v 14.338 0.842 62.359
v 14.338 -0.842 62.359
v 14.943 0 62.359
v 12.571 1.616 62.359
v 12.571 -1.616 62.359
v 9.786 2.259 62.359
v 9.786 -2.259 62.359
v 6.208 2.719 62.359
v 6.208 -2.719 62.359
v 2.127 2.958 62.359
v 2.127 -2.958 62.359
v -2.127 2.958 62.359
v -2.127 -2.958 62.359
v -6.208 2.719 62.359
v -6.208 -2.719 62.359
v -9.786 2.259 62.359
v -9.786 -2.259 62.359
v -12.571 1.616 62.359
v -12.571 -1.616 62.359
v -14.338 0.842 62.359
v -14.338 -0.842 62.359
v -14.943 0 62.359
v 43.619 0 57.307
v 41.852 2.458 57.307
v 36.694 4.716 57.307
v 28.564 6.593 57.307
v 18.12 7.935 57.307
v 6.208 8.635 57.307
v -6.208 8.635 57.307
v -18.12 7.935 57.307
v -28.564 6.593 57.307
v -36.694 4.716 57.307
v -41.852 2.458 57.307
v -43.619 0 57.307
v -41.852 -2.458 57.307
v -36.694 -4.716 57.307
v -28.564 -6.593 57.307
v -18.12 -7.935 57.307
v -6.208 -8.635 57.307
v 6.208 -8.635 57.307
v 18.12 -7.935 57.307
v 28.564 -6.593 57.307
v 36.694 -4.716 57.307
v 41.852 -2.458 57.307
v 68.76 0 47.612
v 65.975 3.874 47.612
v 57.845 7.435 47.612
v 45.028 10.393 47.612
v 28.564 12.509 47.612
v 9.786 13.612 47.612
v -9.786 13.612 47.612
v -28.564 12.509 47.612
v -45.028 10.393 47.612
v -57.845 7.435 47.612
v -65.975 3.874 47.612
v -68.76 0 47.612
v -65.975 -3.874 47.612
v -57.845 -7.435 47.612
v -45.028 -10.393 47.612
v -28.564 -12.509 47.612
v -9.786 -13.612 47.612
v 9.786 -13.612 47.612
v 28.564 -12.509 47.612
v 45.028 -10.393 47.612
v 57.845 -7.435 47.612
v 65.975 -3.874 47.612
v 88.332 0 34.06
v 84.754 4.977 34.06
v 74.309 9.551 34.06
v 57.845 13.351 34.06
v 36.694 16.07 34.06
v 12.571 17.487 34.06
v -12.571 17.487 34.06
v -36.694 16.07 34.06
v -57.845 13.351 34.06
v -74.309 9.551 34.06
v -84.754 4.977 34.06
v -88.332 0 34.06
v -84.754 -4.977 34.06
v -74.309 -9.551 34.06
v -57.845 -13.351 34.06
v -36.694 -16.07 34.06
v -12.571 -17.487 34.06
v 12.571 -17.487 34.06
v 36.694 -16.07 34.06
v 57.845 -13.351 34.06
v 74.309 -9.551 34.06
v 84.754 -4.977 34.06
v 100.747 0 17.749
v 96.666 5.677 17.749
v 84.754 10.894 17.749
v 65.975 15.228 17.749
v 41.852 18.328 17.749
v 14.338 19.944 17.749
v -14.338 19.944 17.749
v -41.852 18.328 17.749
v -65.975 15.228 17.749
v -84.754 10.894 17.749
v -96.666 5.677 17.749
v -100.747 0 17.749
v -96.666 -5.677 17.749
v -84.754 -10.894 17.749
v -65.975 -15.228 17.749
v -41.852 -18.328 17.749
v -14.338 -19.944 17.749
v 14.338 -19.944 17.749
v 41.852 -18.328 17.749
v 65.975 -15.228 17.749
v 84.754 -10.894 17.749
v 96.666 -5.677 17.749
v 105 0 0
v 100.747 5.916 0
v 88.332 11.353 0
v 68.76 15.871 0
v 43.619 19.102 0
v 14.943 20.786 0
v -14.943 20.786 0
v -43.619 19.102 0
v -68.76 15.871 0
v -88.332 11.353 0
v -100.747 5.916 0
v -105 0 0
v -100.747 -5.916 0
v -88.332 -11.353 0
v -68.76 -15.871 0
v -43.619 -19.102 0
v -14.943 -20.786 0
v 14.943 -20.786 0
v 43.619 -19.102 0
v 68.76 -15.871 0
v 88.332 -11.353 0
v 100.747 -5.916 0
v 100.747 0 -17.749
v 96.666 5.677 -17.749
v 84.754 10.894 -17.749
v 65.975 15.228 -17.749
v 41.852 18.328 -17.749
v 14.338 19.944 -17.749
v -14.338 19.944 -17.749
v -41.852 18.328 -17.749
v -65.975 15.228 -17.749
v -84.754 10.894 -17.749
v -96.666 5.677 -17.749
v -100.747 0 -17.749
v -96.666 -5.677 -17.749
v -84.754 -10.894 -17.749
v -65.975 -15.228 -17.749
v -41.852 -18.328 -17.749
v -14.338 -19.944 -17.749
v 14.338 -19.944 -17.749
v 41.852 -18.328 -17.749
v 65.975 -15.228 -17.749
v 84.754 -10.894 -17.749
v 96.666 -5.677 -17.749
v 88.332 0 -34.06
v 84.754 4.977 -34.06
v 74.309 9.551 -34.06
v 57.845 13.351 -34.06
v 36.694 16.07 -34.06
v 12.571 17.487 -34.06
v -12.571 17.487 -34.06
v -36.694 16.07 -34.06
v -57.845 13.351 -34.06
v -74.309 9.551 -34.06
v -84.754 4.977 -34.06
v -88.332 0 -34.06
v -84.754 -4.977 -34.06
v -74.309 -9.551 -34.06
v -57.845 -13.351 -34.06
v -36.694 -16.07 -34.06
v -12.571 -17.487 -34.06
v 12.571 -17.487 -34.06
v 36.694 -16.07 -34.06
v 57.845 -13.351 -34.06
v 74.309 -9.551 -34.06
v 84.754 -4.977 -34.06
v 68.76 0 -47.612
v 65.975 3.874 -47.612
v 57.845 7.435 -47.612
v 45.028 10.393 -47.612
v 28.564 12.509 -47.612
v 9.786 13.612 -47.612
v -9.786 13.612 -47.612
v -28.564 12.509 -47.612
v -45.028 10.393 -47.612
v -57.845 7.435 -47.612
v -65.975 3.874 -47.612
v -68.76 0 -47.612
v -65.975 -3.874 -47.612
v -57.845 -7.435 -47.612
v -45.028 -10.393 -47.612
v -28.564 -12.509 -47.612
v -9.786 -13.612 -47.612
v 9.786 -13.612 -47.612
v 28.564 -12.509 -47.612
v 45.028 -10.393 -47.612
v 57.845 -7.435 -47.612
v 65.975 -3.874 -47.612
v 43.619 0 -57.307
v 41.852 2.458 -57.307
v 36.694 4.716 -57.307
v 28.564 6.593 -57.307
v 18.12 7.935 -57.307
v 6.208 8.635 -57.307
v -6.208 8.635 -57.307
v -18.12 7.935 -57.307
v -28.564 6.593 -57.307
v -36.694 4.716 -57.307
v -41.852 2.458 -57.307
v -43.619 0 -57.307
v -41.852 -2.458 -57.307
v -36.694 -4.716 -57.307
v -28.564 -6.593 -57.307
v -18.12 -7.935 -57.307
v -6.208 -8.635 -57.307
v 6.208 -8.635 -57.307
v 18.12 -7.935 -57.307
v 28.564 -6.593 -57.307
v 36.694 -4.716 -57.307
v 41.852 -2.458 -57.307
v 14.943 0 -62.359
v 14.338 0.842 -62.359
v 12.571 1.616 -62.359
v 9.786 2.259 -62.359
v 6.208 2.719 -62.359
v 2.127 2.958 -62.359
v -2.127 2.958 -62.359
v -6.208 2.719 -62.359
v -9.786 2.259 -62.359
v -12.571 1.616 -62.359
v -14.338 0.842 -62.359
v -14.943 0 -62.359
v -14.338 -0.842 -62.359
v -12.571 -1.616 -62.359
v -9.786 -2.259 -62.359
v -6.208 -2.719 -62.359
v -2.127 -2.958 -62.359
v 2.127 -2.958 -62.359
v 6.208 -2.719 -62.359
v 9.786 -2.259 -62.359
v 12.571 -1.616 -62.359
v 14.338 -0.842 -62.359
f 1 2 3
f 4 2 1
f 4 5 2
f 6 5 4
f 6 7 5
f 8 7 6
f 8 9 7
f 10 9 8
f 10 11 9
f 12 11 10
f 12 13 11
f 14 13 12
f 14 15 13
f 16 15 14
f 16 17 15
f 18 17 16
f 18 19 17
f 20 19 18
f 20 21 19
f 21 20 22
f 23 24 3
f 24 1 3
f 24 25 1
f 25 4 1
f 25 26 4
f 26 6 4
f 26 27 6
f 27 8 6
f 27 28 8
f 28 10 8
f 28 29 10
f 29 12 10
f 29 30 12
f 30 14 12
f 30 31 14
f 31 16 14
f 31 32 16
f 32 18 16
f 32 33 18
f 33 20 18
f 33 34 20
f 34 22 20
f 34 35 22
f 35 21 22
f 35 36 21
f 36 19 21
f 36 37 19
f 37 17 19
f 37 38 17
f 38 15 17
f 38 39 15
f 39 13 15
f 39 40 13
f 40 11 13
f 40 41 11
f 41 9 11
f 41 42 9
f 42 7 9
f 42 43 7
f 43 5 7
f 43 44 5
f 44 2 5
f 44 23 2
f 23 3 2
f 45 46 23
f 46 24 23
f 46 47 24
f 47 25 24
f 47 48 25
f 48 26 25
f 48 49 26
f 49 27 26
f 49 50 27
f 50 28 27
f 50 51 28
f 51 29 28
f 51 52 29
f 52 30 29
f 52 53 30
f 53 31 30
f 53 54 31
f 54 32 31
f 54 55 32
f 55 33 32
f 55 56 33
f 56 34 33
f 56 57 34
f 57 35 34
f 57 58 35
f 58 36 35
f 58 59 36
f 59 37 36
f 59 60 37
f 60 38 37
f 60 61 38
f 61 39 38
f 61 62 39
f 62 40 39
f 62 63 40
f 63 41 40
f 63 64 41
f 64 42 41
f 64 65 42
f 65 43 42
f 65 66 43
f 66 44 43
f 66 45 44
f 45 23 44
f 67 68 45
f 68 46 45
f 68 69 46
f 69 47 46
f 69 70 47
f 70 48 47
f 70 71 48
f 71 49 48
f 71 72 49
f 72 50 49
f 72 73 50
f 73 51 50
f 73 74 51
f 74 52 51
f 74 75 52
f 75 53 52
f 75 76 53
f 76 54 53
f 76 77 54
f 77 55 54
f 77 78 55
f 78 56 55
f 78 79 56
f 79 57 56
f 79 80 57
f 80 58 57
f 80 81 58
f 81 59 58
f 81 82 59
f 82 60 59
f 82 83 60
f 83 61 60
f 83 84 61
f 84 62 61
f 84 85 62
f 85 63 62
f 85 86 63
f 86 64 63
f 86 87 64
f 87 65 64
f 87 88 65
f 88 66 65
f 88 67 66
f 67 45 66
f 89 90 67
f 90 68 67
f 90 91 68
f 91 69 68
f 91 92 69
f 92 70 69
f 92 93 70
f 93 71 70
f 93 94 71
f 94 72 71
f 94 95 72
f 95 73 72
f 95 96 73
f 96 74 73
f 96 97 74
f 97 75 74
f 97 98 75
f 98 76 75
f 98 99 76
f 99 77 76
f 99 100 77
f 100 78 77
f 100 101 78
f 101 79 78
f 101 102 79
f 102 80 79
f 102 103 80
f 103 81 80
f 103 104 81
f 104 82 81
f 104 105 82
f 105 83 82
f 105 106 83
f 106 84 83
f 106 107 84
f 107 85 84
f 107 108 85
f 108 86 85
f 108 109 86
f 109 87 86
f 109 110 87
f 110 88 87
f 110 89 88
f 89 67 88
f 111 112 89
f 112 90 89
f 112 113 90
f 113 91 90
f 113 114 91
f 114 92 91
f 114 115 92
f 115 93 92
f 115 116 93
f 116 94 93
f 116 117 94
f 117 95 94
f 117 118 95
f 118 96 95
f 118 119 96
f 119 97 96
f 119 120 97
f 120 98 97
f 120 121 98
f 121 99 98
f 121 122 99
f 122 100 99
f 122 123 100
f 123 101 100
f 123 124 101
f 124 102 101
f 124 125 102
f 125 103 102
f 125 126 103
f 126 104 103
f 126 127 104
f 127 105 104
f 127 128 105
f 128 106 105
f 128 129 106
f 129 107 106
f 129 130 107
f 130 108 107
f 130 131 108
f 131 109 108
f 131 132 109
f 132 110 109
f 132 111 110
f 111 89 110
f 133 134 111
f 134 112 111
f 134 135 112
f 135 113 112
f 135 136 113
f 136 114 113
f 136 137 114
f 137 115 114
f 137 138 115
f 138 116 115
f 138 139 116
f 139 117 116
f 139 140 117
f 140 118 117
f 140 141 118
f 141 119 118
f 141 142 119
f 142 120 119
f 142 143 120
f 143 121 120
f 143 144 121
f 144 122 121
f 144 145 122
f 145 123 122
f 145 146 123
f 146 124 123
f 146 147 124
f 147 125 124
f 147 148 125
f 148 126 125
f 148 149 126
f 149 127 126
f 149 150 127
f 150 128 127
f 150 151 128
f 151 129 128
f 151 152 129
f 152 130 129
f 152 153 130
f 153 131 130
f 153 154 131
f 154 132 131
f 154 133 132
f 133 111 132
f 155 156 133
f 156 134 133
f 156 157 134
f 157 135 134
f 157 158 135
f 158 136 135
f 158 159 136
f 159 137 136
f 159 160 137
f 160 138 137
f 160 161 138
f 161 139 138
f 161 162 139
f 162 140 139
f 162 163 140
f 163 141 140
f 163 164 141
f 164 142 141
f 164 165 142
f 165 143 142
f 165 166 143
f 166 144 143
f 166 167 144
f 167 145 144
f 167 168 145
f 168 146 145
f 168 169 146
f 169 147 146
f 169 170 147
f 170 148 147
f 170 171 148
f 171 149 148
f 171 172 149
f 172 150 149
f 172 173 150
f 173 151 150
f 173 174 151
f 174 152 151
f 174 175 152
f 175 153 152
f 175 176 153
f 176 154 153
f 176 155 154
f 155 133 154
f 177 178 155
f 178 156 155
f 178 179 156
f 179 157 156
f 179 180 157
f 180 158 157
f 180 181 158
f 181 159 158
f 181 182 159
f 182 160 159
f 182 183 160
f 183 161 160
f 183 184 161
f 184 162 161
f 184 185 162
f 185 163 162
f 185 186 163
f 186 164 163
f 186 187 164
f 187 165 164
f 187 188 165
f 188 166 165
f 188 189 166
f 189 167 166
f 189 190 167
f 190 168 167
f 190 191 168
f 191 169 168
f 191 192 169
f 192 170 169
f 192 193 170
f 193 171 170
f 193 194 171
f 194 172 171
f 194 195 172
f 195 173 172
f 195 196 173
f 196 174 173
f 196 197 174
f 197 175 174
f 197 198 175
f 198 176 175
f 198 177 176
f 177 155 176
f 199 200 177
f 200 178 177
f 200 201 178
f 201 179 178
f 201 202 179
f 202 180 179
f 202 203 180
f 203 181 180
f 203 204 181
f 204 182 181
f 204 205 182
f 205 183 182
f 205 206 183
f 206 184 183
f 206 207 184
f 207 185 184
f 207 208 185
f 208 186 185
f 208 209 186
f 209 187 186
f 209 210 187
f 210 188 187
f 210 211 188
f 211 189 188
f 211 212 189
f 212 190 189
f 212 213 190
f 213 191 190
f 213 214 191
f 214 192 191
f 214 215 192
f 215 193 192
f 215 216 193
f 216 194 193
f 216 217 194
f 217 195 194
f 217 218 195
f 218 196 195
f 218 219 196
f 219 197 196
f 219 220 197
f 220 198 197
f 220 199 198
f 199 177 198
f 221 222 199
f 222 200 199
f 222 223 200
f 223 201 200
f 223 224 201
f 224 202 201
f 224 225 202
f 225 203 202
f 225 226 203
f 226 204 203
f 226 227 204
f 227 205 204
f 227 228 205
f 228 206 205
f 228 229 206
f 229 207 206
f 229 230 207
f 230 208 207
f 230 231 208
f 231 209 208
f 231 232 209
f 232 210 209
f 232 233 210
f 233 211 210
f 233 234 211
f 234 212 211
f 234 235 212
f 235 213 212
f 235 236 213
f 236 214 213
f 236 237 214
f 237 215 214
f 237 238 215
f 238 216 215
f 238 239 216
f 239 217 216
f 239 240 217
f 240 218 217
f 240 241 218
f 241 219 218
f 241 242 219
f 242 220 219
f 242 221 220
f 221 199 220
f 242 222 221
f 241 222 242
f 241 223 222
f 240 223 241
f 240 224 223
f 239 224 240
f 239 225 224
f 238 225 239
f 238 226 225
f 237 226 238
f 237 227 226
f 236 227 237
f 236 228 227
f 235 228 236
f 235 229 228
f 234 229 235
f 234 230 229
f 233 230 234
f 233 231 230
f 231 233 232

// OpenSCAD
// Generated by SolidPython 1.0.1 on 2020-07-29 00:46:51


scale(v = [15, 3, 9]) {
	sphere(r = 7);
}
/***********************************************
*********      SolidPython code:      **********
************************************************
 
# import packages: SolidPython
from solid import *
from solid.utils import *
from itertools import chain, combinations, permutations


class Resize:

    def __init__(self, scad_file):
        self.scad_file = scad_file
        #self.scad_file = import_scad(scad_file)
        # cone/cylinder param:
        self.r1 = 0
        self.r2 = 0
        self.h = 0
        # rectangular prism param:
        self.w = 0
        self.l = 0
        # ellipse param:
        self.r = 0

    # import OpenScad code (file name corresponds to shape)


    # classify shape + parameters
    def assign(self, param1, param2, param3):
        if self.scad_file == 'cone.scad':
            self.r1 = param1
            self.r2 = param2
            self.h = param3
        elif self.scad_file == 'cylinder.scad':
            self.r1 = param1
            self.r2 = param2
            self.h = param3
        elif self.scad_file == 'rectangularPrism.scad':
            self.h = param1
            self.l = param2
            self.w = param3
        else:
            self.r = param1
            self.h = param2

    # resize parameters
    def iterate(self):
        x = range(3, 20, 2)
        i = 1
        if self.scad_file == 'cone.scad':
            tempList = list(permutations(x, 2))
            for temp in tempList:
                param1 = temp[0]
                param2 = temp[1]
                filepath = 'produced_scad_files/' + 'cone' + str(param1) + '_' + str(param2) + '_' + '.scad'
                scad_render_to_file(cylinder(h=param1, r1=param2, r2=0), filepath)

        elif self.scad_file == 'cylinder.scad':
            tempList = list(permutations(x, 3))
            for temp in tempList:
                param1 = temp[0]
                param2 = temp[1]
                filepath = 'produced_scad_files/' + 'cylinder' + str(param1) + '_' + str(param2) + '_' + '.scad'
                scad_render_to_file(cylinder(h=param1, r1=param2, r2=param2), filepath)

        elif self.scad_file == 'rectangularPrism.scad':
            tempList = list(permutations(x, 3))
            for temp in tempList:
                param1 = temp[0]
                param2 = temp[1]
                param3 = temp[2]
                filepath = 'produced_scad_files/' + 'rectangularPrism' + str(param1) + '_' + str(param2) + '_' + str(
                    param3) + '.scad'
                scad_render_to_file(cube(size=(param1, param2, param3)), filepath)

        elif self.scad_file == 'ellipse.scad':
            tempList = list(permutations(x, 4))
            for temp in tempList:
                param1 = temp[0]
                param2 = temp[1]
                param3 = temp[2]
                param4 = temp[3]
                filepath = 'produced_scad_files/' + 'ellipse' + str(param1) + '_' + str(param2) + '_' + str(param3) + '_' + str(param4) + '.scad'
                scad_render_to_file(scale([param1, param2, param3])(sphere(r=param4)), filepath)

    def render_to_scadfile(self):
        scad_render_to_file(scad, 'example.scad') 
 
************************************************/
